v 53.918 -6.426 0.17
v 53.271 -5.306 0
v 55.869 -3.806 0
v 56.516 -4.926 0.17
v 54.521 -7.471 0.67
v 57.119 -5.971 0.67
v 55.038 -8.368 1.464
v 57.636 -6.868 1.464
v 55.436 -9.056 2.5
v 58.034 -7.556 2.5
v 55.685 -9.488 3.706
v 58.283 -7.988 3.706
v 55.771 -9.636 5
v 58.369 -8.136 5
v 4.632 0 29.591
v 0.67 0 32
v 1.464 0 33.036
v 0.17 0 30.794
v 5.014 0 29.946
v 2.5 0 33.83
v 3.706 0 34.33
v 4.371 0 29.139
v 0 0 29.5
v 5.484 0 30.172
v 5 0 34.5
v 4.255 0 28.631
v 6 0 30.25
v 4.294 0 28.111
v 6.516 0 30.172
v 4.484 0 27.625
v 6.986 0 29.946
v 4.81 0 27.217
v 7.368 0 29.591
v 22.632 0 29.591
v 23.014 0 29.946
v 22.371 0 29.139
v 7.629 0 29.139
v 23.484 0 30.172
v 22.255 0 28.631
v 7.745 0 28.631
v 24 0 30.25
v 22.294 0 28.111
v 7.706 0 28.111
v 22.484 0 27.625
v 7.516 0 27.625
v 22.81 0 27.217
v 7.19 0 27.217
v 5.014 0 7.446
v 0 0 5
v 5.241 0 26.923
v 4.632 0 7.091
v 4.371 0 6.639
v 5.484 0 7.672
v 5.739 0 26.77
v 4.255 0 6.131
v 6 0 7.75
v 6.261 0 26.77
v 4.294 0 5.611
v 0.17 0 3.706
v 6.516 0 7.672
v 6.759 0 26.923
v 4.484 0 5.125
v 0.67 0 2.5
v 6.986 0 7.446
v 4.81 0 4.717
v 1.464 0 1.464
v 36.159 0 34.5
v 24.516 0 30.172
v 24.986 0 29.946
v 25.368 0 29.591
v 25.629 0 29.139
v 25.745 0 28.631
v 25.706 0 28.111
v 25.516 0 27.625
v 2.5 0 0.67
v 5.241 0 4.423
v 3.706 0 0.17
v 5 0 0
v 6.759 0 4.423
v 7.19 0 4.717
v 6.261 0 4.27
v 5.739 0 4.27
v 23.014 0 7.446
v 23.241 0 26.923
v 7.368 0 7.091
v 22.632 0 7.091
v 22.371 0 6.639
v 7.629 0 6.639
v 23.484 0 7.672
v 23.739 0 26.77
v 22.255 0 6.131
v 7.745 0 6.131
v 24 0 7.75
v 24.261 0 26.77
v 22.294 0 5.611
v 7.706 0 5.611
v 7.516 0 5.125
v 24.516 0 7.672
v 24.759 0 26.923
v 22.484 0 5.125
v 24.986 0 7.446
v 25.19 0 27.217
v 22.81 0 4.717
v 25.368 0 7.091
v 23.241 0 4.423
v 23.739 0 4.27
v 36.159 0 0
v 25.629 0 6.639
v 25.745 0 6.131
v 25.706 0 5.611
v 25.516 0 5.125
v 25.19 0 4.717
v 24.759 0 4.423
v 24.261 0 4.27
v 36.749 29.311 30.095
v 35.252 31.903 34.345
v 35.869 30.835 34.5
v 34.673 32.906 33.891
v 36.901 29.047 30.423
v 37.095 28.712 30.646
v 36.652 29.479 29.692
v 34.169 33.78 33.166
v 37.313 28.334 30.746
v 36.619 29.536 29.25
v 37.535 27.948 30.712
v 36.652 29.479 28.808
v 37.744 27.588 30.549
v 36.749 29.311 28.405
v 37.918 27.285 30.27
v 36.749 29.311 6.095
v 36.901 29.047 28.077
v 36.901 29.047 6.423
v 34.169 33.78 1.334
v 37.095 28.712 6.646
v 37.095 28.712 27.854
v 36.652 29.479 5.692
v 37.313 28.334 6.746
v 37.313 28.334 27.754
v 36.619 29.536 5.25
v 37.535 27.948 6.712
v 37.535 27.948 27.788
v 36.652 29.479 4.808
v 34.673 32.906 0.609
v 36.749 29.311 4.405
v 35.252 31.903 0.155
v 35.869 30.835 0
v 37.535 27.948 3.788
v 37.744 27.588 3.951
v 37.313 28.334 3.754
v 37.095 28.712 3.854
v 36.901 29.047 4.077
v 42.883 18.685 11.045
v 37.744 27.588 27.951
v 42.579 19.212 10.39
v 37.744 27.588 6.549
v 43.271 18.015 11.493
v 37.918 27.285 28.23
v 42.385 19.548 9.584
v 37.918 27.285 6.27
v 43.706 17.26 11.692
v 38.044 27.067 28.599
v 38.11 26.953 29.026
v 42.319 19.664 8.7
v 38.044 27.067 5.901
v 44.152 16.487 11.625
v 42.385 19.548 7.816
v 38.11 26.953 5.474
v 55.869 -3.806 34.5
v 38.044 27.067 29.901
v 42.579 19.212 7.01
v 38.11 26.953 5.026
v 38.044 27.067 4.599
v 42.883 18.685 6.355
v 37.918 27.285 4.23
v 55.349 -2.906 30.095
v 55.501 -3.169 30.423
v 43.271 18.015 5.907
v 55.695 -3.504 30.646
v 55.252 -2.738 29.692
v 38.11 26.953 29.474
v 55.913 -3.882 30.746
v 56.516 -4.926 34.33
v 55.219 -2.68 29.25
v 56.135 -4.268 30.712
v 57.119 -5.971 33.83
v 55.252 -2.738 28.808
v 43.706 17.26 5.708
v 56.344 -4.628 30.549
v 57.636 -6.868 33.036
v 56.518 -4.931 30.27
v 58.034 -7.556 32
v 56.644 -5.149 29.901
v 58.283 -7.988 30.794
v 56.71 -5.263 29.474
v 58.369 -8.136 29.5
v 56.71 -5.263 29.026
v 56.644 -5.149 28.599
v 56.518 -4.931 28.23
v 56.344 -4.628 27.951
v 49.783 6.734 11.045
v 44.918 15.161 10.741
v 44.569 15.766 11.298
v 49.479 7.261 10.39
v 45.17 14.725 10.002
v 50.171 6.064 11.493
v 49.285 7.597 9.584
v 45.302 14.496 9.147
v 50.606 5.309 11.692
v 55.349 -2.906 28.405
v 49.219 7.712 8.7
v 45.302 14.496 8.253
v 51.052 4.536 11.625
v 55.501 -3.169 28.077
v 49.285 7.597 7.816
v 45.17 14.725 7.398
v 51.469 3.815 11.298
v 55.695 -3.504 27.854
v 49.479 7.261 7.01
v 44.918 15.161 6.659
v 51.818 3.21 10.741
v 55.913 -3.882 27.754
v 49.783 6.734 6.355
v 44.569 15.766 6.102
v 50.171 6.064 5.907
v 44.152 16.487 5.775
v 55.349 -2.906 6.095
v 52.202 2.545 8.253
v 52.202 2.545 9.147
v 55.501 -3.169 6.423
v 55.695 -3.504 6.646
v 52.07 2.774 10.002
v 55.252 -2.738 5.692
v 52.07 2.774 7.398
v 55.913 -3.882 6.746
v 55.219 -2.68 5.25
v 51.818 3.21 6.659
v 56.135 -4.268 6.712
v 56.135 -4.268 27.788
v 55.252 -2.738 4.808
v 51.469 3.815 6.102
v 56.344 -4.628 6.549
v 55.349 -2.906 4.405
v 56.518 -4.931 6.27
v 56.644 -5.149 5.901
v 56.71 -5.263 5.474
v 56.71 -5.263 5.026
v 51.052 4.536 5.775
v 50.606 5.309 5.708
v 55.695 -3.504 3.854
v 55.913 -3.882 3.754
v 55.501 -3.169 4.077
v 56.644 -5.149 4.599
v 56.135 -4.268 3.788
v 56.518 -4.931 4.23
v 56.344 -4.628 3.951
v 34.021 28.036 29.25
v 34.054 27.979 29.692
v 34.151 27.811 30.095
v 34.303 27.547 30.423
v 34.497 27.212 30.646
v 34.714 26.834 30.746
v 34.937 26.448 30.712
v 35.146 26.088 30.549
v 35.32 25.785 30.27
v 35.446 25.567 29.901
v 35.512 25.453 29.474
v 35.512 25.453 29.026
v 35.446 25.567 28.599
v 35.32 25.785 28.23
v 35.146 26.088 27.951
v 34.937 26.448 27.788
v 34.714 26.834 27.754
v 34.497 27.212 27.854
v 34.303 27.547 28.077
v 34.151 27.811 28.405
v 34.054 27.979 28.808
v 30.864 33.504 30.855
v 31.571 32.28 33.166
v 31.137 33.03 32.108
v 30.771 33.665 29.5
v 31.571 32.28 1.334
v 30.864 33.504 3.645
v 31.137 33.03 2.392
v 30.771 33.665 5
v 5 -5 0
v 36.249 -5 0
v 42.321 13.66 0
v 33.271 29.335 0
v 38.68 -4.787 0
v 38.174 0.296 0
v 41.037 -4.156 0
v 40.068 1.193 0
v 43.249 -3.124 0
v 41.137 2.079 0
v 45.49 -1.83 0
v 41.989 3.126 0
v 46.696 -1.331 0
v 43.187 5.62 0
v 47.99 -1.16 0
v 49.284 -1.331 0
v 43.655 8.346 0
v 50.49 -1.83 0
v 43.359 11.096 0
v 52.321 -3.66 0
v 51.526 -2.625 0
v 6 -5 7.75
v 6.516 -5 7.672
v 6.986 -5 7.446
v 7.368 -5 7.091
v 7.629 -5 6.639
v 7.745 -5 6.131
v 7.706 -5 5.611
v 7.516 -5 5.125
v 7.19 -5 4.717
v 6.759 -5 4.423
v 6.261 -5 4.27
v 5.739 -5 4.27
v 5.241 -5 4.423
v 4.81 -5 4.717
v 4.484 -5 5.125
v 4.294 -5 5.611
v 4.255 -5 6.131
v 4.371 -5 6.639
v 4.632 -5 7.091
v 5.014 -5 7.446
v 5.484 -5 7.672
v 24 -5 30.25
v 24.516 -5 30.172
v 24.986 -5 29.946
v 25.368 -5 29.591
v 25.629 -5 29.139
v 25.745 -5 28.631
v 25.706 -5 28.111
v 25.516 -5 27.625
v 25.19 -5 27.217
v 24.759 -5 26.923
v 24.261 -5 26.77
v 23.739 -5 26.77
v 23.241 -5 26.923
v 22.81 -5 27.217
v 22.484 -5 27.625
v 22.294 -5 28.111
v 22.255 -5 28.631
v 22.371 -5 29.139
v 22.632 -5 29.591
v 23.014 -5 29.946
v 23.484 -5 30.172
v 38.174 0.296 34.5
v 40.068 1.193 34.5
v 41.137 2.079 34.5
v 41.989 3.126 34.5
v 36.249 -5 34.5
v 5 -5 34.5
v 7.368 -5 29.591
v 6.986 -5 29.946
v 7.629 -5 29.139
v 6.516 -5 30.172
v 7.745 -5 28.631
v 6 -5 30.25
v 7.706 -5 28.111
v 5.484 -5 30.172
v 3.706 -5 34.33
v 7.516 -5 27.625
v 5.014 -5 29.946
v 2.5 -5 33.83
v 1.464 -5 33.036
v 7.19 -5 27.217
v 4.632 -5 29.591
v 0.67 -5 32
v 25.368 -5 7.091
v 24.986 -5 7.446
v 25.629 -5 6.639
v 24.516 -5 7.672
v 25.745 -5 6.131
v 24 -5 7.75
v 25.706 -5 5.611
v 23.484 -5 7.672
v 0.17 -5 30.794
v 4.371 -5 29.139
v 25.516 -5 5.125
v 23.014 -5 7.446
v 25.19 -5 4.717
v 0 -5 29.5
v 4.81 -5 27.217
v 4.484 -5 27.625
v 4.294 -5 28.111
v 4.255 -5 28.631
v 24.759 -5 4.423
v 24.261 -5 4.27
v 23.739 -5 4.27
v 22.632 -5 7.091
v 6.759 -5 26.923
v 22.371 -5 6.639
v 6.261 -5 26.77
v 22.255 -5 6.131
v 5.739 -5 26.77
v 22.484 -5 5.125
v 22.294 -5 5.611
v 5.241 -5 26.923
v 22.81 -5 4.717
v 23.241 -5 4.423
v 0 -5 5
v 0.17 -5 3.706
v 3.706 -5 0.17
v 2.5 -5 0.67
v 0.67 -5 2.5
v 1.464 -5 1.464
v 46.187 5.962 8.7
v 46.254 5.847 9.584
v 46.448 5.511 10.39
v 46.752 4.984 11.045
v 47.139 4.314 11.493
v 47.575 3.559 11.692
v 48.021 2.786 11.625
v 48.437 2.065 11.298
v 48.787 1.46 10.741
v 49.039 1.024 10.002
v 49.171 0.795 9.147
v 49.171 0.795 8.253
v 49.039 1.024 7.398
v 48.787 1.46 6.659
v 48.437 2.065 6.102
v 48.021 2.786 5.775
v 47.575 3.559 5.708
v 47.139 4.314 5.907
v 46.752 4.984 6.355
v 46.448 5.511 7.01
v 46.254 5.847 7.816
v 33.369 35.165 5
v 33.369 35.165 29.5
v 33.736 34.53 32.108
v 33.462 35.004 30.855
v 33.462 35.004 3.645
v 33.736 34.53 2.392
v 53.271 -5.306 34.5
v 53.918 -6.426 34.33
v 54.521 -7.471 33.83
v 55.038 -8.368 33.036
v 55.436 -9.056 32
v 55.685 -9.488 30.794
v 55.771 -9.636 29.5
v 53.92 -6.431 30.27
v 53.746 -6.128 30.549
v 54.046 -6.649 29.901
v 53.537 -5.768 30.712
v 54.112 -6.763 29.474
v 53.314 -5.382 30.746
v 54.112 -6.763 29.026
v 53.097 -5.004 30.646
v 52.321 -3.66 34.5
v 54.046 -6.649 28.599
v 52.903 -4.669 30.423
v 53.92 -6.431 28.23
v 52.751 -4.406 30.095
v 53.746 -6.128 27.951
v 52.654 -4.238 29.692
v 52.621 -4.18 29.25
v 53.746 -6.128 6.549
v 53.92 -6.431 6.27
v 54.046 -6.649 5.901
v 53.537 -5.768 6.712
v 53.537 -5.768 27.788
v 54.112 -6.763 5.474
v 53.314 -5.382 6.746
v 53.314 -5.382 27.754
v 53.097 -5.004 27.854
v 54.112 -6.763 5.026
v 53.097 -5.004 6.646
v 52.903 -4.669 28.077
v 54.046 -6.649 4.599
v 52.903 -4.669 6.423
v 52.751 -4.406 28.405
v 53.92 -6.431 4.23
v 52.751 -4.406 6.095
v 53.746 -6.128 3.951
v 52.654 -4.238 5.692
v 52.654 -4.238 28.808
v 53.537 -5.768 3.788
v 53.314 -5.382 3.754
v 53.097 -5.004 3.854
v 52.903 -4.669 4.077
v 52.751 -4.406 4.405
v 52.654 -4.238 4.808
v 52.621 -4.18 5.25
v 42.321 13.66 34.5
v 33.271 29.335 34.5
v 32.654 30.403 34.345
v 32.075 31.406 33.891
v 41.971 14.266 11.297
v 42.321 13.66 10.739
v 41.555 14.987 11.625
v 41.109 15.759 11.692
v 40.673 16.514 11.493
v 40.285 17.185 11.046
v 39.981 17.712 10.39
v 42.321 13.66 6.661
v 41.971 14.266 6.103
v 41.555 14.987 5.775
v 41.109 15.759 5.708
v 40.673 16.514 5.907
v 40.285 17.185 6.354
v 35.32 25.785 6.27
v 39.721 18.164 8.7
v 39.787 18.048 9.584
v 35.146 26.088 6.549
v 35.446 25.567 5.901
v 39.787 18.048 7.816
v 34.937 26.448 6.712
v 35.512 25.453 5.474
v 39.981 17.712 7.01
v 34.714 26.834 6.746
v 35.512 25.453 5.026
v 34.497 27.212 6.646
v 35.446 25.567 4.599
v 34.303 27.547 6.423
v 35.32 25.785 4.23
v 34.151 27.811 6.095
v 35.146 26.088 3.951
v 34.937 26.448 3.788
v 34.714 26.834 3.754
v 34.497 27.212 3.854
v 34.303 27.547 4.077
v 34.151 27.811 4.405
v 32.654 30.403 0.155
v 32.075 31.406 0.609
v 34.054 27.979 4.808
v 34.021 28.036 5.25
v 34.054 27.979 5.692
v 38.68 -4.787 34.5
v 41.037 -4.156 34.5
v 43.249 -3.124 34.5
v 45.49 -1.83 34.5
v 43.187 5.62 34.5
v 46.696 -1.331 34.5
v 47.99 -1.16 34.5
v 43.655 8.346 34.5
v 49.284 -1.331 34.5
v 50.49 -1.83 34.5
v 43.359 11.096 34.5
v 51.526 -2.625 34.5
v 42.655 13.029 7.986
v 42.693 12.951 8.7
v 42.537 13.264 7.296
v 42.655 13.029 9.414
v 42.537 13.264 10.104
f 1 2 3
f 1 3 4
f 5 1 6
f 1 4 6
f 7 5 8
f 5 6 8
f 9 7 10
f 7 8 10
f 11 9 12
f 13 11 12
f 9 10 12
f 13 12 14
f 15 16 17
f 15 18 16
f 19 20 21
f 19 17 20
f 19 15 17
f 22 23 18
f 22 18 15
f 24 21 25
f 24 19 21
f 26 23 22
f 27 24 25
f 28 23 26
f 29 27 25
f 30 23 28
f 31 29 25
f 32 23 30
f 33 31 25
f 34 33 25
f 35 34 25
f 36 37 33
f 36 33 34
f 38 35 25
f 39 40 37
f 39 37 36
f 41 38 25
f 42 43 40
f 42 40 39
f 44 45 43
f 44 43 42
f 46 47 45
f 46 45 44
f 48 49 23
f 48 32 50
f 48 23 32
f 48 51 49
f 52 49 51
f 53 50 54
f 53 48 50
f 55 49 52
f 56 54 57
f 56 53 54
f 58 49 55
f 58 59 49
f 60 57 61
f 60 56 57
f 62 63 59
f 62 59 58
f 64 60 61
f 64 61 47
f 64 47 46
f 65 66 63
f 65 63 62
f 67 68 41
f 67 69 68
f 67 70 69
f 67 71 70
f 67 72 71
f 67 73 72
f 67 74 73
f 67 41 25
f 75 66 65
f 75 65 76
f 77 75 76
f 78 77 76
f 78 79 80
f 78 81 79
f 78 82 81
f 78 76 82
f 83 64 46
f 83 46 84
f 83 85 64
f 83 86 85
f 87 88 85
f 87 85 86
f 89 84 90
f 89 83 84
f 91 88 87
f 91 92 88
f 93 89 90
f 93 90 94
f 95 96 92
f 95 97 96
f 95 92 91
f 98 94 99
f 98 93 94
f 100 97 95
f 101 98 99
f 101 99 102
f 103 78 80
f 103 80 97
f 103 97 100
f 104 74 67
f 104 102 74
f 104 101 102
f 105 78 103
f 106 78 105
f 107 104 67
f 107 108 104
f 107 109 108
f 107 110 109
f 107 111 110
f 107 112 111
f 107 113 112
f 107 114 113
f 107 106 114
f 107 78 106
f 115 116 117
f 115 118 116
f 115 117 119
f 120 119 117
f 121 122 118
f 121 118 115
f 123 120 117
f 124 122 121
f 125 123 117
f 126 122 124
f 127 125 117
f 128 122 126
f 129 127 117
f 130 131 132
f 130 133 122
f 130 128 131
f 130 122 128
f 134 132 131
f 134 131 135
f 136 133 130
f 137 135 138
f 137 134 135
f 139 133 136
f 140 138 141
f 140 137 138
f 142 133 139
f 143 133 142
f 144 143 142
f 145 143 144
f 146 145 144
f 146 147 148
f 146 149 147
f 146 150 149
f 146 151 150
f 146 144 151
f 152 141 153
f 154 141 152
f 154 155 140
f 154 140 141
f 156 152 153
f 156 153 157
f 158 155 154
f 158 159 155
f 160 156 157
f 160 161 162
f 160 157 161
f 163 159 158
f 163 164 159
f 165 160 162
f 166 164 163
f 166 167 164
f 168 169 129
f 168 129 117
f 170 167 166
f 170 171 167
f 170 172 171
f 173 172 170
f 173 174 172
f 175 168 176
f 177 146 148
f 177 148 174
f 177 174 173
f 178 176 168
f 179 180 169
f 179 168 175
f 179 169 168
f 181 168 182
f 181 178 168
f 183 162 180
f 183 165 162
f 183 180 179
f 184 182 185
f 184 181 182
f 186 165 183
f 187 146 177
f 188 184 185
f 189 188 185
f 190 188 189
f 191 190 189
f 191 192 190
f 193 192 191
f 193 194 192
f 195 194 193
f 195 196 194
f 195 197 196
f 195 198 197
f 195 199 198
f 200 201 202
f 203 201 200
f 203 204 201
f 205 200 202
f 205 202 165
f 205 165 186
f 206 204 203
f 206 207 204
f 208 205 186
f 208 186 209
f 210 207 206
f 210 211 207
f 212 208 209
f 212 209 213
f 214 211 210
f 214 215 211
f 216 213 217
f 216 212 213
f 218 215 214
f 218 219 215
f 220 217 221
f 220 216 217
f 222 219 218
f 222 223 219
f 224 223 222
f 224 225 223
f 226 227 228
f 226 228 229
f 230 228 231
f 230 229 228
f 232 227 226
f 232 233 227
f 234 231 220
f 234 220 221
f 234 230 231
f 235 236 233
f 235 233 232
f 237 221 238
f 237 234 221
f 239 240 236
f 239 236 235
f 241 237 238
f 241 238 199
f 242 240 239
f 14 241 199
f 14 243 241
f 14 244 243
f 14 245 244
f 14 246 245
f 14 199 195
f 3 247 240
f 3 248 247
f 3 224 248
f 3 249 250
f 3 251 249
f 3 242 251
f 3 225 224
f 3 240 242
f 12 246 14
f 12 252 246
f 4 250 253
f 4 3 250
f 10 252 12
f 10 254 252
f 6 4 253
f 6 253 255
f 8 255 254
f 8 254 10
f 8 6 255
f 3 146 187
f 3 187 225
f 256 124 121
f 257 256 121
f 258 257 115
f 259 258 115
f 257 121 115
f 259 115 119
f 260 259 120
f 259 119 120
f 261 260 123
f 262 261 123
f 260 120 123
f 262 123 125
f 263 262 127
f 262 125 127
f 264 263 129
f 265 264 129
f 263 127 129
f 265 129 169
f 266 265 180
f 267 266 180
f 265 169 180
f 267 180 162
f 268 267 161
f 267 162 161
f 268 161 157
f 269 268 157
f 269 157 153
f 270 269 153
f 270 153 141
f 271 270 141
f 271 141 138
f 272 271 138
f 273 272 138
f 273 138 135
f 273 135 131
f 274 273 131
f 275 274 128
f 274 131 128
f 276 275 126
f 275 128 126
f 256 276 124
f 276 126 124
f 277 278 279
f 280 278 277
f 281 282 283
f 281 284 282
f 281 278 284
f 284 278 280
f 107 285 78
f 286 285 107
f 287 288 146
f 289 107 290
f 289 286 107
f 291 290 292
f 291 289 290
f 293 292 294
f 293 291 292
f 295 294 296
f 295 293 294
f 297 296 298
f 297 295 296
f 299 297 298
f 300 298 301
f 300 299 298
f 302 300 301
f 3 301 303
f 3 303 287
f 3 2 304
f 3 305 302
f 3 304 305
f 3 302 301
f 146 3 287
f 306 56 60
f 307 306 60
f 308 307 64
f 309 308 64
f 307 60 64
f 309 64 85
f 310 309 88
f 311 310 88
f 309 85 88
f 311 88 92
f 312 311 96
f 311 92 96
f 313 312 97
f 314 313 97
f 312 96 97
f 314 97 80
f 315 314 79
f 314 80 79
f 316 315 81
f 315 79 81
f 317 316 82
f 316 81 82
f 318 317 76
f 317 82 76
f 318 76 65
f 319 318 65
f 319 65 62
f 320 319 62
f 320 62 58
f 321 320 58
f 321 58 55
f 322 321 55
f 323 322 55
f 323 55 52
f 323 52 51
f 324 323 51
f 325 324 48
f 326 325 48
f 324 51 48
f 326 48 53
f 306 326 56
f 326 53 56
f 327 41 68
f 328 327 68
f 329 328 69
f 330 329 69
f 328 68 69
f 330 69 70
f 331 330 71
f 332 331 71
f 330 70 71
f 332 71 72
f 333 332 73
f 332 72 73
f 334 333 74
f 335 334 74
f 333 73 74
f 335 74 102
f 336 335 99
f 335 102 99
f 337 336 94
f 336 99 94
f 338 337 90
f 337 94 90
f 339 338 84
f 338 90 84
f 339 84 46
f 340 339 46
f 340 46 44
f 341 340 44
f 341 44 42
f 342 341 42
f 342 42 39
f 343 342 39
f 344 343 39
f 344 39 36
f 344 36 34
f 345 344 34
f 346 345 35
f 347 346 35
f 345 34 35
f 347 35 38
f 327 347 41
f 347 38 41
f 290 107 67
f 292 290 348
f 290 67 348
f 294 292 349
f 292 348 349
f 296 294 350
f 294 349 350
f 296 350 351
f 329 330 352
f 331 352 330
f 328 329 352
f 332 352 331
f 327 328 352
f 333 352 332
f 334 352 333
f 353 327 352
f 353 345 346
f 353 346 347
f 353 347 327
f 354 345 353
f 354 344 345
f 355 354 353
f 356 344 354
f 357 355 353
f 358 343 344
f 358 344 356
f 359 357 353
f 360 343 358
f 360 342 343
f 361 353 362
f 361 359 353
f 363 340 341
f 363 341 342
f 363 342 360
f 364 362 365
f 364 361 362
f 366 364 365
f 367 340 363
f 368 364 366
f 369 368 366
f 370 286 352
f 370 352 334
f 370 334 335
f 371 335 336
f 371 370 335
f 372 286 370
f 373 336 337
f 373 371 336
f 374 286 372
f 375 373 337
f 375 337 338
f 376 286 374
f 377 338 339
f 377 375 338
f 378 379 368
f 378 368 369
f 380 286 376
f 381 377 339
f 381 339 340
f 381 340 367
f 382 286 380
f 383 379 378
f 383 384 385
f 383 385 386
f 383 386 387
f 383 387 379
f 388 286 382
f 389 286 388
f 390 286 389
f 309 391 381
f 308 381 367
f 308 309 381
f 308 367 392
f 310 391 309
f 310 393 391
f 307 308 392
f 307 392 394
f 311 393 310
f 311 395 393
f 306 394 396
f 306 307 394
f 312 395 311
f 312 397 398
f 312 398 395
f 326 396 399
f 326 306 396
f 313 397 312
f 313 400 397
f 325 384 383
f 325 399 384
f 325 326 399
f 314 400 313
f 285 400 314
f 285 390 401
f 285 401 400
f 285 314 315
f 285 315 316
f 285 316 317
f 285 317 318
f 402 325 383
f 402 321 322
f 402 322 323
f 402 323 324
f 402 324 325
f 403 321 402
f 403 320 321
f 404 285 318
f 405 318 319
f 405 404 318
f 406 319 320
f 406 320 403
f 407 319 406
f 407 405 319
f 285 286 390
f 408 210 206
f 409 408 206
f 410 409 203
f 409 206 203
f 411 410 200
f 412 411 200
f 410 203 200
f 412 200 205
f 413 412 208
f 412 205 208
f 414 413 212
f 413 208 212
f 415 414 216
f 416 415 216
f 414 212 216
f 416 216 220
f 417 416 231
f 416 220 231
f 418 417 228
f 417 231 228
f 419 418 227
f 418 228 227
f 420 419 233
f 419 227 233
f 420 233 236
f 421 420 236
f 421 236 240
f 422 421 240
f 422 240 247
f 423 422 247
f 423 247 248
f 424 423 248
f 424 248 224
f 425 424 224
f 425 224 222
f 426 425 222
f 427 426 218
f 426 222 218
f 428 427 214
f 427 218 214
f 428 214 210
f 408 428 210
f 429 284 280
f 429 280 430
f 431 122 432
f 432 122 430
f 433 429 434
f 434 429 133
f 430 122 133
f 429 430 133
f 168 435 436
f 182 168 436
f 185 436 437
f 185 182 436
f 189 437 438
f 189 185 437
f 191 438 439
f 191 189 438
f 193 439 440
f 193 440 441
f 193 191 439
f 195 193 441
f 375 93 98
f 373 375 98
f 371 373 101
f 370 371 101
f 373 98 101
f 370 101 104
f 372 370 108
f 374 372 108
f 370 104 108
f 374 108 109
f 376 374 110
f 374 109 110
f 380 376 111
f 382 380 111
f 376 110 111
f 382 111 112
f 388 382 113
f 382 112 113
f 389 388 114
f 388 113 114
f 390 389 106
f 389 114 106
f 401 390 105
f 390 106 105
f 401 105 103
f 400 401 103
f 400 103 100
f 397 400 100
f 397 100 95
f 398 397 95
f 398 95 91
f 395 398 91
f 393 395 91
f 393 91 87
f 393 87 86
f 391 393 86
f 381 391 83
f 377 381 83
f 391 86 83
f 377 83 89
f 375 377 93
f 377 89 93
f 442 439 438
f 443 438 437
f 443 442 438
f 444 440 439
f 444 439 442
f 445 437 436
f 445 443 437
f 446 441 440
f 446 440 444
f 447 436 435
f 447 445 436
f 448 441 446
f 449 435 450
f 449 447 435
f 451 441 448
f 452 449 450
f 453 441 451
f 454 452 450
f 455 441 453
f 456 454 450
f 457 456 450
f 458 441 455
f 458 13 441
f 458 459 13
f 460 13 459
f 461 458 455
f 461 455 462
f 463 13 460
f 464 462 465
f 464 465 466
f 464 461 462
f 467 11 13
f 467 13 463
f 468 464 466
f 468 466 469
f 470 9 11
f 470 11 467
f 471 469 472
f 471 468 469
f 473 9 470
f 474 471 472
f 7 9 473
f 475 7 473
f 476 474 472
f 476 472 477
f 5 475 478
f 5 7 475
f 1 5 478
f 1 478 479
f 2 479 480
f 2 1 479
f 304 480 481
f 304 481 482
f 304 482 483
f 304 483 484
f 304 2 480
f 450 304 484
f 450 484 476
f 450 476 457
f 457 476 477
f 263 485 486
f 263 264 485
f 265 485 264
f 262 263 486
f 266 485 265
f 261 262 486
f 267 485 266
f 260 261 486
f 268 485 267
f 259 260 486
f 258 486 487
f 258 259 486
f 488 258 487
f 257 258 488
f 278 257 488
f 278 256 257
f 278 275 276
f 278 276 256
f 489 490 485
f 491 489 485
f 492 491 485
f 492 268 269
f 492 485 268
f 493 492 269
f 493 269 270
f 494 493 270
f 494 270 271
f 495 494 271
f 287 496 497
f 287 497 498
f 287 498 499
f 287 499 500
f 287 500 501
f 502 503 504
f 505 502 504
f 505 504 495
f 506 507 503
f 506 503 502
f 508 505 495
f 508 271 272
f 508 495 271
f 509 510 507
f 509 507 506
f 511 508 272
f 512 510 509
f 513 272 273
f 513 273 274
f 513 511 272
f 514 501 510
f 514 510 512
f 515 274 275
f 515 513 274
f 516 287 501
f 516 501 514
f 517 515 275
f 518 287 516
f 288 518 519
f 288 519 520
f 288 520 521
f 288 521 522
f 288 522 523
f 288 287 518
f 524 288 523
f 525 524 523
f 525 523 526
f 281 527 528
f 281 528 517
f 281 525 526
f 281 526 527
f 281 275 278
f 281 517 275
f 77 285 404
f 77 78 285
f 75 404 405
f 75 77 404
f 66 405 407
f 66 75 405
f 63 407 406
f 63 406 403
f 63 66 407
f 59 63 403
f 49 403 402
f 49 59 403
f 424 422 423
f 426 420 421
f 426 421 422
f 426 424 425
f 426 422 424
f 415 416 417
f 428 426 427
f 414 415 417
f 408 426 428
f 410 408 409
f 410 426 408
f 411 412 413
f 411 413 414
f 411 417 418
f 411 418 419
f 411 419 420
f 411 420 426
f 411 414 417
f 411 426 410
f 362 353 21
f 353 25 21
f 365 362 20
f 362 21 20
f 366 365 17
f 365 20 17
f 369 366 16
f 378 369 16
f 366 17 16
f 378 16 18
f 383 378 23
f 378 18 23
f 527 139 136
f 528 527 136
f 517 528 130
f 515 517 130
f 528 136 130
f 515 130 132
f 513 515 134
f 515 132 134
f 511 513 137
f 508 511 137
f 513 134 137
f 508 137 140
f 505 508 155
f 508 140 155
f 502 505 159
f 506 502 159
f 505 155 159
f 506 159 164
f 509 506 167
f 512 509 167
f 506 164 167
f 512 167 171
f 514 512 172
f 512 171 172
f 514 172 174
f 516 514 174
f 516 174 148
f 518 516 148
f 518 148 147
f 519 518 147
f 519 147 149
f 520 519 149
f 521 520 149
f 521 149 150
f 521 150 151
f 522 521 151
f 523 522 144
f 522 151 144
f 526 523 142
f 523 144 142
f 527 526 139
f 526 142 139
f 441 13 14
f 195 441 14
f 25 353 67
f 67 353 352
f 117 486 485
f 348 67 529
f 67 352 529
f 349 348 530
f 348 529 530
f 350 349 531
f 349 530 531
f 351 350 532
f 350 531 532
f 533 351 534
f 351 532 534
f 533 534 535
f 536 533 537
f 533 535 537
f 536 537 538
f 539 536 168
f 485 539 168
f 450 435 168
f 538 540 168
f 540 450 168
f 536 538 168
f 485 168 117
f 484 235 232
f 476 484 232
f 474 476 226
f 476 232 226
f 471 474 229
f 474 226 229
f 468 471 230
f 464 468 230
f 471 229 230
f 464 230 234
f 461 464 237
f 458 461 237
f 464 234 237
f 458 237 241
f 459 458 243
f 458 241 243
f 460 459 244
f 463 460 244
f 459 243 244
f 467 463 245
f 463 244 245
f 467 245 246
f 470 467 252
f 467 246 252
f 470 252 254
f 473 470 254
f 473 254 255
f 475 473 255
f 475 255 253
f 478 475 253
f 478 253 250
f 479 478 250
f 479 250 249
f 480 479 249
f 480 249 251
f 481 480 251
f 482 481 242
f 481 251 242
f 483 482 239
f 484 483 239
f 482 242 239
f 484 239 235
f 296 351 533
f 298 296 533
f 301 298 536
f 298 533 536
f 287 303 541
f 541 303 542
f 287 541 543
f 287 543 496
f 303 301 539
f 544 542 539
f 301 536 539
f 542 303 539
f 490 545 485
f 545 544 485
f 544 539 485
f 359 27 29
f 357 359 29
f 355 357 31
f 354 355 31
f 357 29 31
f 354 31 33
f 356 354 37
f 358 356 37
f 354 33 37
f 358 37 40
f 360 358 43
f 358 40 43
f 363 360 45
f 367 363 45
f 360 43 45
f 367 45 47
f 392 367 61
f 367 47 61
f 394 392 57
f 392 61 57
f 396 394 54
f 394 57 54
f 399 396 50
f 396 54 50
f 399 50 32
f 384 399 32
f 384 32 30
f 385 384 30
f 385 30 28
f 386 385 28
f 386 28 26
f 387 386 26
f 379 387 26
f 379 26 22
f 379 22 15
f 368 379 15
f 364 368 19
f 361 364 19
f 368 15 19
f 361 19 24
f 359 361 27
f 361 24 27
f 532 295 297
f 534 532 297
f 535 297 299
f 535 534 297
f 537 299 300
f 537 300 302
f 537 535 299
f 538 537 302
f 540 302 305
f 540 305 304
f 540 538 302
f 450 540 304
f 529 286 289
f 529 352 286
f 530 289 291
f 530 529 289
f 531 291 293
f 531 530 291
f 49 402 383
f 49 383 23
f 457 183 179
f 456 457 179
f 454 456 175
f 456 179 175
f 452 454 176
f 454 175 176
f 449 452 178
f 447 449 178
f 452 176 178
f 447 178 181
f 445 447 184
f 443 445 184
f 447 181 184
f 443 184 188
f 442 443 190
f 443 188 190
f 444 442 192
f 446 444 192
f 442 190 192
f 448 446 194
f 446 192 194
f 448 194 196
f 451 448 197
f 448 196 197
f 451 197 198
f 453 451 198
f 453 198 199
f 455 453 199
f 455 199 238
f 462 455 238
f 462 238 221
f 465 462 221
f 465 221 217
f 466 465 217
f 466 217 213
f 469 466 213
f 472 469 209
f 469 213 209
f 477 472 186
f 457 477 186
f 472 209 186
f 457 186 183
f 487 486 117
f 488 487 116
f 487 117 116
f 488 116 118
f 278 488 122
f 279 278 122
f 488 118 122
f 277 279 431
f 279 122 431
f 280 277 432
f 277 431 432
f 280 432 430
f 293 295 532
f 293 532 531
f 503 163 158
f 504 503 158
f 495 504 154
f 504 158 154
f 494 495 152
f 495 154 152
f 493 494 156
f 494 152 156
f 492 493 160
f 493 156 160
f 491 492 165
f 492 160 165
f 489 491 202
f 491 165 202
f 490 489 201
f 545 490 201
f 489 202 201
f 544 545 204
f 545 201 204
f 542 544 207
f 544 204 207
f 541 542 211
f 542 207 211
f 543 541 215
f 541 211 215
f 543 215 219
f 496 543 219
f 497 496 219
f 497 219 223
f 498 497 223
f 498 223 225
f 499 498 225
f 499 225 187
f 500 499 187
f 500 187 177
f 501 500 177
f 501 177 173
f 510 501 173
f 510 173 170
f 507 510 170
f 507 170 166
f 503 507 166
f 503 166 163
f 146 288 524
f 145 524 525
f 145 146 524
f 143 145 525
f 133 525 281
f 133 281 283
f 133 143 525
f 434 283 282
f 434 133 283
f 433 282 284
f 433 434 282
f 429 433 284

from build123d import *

# Parameters (mm, degrees)
P_IDAT_VYSUNUT_M1_DEPTH       = 34.5
SKICA2_R                      = 1.5
ODEBRAT_VYSUNUT_M1_DEPTH      = 3
SKICA4_R                      = 1.75
ODEBRAT_VYSUNUT_M2_DEPTH      = 5
SKICA6_W                      = 3
SKICA6_H                      = 34.5
P_IDAT_VYSUNUT_M3_DEPTH       = 1.6
SKICA7_W                      = 3
SKICA7_H                      = 34.5
ODEBRAT_VYSUNUT_M3_DEPTH      = 1.6
ZAOBLIT1_R                    = 5
ZAOBLIT2_R                    = 5
ZAOBLIT3_R                    = 10
ZAOBLIT4_R                    = 5
ZAOBLIT5_R                    = 7
ZAOBLIT6_R                    = 14
ODEBRAT_VYSUNUT_M5_REACH      = 64.381
ODEBRAT_VYSUNUT_M5_END_RADIUS = 10
SKICA8_R                      = 3
SKICA9_R                      = 3
ODEBRAT_VYSUNUT_M6_DEPTH      = 3.5


with BuildPart() as part:
    # Skica1 → Přidat vysunutím1 (new body)
    with BuildSketch(Plane.XY):
        Polygon((0, 0), (38.660254038, 0), (47.320508076, 5), (31.570508076, 32.279800219), (34.168584287, 33.779800219), (59.168584287, -9.52146997), (56.570508076, -11.02146997), (49.820508076, 0.669872981), (40, -5), (0, -5), align=None)
    extrude(amount=P_IDAT_VYSUNUT_M1_DEPTH)

    # Skica2 → Odebrat vysunutím1 (cut)
    with BuildSketch(Plane(origin=(40.253520778, 23.240381057, 0), x_dir=(0, 0, -1), z_dir=(0.8660254037844362, 0.5000000000000046, 0))):
        with Locations(Location((-29.25, 5.769872981, 0), (0, 0, 90))):
            Circle(SKICA2_R)
        with Locations(Location((-29.25, -31.430127019, 0), (0, 0, 90))):
            Circle(SKICA2_R)
        with Locations(Location((-5.25, 5.769872981, 0), (0, 0, 90))):
            Circle(SKICA2_R)
        with Locations(Location((-5.25, -31.430127019, 0), (0, 0, 90))):
            Circle(SKICA2_R)
    extrude(amount=-ODEBRAT_VYSUNUT_M1_DEPTH, mode=Mode.SUBTRACT)

    # Skica4 → Odebrat vysunutím2 (cut)
    with BuildSketch(Plane(origin=(0, 0, 0), x_dir=(1, 0, 0), z_dir=(0, 1, 0))):
        with Locations(Location((6, -6, 0), (0, 0, 270))):
            Circle(SKICA4_R)
        with Locations(Location((6, -28.5, 0), (0, 0, 270))):
            Circle(SKICA4_R)
        with Locations(Location((24, -28.5, 0), (0, 0, 270))):
            Circle(SKICA4_R)
        with Locations(Location((24, -6, 0), (0, 0, 270))):
            Circle(SKICA4_R)
    extrude(amount=-ODEBRAT_VYSUNUT_M2_DEPTH, mode=Mode.SUBTRACT)

    # Skica6 → Přidat vysunutím3 (add)
    with BuildSketch(Plane(origin=(-6.084936491, 10.539419162, 0), x_dir=(0.8660254037844357, 0.5000000000000052, 0), z_dir=(-0.5000000000000052, 0.8660254037844357, 0))):
        with Locations((44.980762114, -17.25)):
            Rectangle(SKICA6_W, SKICA6_H)
    extrude(amount=P_IDAT_VYSUNUT_M3_DEPTH)

    # Skica7 → Odebrat vysunutím3 (cut)
    with BuildSketch(Plane(origin=(18.915063509, -32.761851027, 0), x_dir=(0.8660254037844368, 0.5000000000000032, 0), z_dir=(0.5000000000000032, -0.8660254037844368, 0))):
        with Locations((44.980762114, 17.25)):
            Rectangle(SKICA7_W, SKICA7_H)
    extrude(amount=-ODEBRAT_VYSUNUT_M3_DEPTH, mode=Mode.SUBTRACT)

    # Zaoblit1
    zaoblit1_edges = [part.edges().sort_by_distance(p)[0] for p in [
        (32.069546181, 34.415440865, 0),
        (32.069546181, 34.415440865, 34.5),
        (57.069546181, -8.885829324, 34.5),
        (57.069546181, -8.885829324, 0),
    ]]
    fillet(zaoblit1_edges, radius=ZAOBLIT1_R)

    # Zaoblit2
    zaoblit2_edges = [part.edges().sort_by_distance(p)[0] for p in [
        (0, -2.5, 0),
        (0, -2.5, 34.5),
    ]]
    fillet(zaoblit2_edges, radius=ZAOBLIT2_R)

    # Zaoblit3
    zaoblit3_edges = [part.edges().sort_by_distance(p)[0] for p in [
        (47.320508076, 5, 17.25),
    ]]
    fillet(zaoblit3_edges, radius=ZAOBLIT3_R - 0.0001)  # a hair under: the kernel refuses the full size

    # Zaoblit4
    zaoblit4_edges = [part.edges().sort_by_distance(p)[0] for p in [
        (49.820508076, 0.669872981, 17.25),
    ]]
    fillet(zaoblit4_edges, radius=ZAOBLIT4_R)

    # Zaoblit5
    zaoblit5_edges = [part.edges().sort_by_distance(p)[0] for p in [
        (38.660254038, 0, 17.25),
    ]]
    fillet(zaoblit5_edges, radius=ZAOBLIT5_R)

    # Zaoblit6
    zaoblit6_edges = [part.edges().sort_by_distance(p)[0] for p in [
        (40, -5, 17.25),
    ]]
    fillet(zaoblit6_edges, radius=ZAOBLIT6_R)

    # Odebrat vysunutím5: up to this cylinder (the profile starts outside it)
    odebrat_vysunut_m5_end = Plane(origin=(33.660254038, 8.660254038, 8.7), z_dir=(0, 0, 1)) * Cylinder(ODEBRAT_VYSUNUT_M5_END_RADIUS, 149.762, mode=Mode.PRIVATE)
    # Skica8 → Odebrat vysunutím5 (cut, up to the surface)
    with BuildSketch(Plane(origin=(40.253520778, 23.240381057, 0), x_dir=(0, 0, -1), z_dir=(0.8660254037844367, 0.5000000000000033, 0)), mode=Mode.PRIVATE) as odebrat_vysunut_m5_sk1:
        with Locations(Location((-8.7, -7.130127019, 0), (0, 0, 90))):
            Circle(SKICA8_R)
    odebrat_vysunut_m5_tool1 = extrude(odebrat_vysunut_m5_sk1.sketch, amount=-ODEBRAT_VYSUNUT_M5_REACH, mode=Mode.PRIVATE) - odebrat_vysunut_m5_end
    add(odebrat_vysunut_m5_tool1.solids().sort_by_distance((43.818584, 17.06551, 8.7))[0], mode=Mode.SUBTRACT)

    # Skica9 → Odebrat vysunutím6 (cut)
    with BuildSketch(Plane(origin=(40.253520778, 23.240381057, 0), x_dir=(0, 0, -1), z_dir=(0.8660254037844367, 0.5000000000000033, 0))):
        with Locations(Location((-8.7, -20.930127019, 0), (0, 0, 90))):
            Circle(SKICA9_R)
    extrude(amount=-ODEBRAT_VYSUNUT_M6_DEPTH, mode=Mode.SUBTRACT)


solid = part.part
